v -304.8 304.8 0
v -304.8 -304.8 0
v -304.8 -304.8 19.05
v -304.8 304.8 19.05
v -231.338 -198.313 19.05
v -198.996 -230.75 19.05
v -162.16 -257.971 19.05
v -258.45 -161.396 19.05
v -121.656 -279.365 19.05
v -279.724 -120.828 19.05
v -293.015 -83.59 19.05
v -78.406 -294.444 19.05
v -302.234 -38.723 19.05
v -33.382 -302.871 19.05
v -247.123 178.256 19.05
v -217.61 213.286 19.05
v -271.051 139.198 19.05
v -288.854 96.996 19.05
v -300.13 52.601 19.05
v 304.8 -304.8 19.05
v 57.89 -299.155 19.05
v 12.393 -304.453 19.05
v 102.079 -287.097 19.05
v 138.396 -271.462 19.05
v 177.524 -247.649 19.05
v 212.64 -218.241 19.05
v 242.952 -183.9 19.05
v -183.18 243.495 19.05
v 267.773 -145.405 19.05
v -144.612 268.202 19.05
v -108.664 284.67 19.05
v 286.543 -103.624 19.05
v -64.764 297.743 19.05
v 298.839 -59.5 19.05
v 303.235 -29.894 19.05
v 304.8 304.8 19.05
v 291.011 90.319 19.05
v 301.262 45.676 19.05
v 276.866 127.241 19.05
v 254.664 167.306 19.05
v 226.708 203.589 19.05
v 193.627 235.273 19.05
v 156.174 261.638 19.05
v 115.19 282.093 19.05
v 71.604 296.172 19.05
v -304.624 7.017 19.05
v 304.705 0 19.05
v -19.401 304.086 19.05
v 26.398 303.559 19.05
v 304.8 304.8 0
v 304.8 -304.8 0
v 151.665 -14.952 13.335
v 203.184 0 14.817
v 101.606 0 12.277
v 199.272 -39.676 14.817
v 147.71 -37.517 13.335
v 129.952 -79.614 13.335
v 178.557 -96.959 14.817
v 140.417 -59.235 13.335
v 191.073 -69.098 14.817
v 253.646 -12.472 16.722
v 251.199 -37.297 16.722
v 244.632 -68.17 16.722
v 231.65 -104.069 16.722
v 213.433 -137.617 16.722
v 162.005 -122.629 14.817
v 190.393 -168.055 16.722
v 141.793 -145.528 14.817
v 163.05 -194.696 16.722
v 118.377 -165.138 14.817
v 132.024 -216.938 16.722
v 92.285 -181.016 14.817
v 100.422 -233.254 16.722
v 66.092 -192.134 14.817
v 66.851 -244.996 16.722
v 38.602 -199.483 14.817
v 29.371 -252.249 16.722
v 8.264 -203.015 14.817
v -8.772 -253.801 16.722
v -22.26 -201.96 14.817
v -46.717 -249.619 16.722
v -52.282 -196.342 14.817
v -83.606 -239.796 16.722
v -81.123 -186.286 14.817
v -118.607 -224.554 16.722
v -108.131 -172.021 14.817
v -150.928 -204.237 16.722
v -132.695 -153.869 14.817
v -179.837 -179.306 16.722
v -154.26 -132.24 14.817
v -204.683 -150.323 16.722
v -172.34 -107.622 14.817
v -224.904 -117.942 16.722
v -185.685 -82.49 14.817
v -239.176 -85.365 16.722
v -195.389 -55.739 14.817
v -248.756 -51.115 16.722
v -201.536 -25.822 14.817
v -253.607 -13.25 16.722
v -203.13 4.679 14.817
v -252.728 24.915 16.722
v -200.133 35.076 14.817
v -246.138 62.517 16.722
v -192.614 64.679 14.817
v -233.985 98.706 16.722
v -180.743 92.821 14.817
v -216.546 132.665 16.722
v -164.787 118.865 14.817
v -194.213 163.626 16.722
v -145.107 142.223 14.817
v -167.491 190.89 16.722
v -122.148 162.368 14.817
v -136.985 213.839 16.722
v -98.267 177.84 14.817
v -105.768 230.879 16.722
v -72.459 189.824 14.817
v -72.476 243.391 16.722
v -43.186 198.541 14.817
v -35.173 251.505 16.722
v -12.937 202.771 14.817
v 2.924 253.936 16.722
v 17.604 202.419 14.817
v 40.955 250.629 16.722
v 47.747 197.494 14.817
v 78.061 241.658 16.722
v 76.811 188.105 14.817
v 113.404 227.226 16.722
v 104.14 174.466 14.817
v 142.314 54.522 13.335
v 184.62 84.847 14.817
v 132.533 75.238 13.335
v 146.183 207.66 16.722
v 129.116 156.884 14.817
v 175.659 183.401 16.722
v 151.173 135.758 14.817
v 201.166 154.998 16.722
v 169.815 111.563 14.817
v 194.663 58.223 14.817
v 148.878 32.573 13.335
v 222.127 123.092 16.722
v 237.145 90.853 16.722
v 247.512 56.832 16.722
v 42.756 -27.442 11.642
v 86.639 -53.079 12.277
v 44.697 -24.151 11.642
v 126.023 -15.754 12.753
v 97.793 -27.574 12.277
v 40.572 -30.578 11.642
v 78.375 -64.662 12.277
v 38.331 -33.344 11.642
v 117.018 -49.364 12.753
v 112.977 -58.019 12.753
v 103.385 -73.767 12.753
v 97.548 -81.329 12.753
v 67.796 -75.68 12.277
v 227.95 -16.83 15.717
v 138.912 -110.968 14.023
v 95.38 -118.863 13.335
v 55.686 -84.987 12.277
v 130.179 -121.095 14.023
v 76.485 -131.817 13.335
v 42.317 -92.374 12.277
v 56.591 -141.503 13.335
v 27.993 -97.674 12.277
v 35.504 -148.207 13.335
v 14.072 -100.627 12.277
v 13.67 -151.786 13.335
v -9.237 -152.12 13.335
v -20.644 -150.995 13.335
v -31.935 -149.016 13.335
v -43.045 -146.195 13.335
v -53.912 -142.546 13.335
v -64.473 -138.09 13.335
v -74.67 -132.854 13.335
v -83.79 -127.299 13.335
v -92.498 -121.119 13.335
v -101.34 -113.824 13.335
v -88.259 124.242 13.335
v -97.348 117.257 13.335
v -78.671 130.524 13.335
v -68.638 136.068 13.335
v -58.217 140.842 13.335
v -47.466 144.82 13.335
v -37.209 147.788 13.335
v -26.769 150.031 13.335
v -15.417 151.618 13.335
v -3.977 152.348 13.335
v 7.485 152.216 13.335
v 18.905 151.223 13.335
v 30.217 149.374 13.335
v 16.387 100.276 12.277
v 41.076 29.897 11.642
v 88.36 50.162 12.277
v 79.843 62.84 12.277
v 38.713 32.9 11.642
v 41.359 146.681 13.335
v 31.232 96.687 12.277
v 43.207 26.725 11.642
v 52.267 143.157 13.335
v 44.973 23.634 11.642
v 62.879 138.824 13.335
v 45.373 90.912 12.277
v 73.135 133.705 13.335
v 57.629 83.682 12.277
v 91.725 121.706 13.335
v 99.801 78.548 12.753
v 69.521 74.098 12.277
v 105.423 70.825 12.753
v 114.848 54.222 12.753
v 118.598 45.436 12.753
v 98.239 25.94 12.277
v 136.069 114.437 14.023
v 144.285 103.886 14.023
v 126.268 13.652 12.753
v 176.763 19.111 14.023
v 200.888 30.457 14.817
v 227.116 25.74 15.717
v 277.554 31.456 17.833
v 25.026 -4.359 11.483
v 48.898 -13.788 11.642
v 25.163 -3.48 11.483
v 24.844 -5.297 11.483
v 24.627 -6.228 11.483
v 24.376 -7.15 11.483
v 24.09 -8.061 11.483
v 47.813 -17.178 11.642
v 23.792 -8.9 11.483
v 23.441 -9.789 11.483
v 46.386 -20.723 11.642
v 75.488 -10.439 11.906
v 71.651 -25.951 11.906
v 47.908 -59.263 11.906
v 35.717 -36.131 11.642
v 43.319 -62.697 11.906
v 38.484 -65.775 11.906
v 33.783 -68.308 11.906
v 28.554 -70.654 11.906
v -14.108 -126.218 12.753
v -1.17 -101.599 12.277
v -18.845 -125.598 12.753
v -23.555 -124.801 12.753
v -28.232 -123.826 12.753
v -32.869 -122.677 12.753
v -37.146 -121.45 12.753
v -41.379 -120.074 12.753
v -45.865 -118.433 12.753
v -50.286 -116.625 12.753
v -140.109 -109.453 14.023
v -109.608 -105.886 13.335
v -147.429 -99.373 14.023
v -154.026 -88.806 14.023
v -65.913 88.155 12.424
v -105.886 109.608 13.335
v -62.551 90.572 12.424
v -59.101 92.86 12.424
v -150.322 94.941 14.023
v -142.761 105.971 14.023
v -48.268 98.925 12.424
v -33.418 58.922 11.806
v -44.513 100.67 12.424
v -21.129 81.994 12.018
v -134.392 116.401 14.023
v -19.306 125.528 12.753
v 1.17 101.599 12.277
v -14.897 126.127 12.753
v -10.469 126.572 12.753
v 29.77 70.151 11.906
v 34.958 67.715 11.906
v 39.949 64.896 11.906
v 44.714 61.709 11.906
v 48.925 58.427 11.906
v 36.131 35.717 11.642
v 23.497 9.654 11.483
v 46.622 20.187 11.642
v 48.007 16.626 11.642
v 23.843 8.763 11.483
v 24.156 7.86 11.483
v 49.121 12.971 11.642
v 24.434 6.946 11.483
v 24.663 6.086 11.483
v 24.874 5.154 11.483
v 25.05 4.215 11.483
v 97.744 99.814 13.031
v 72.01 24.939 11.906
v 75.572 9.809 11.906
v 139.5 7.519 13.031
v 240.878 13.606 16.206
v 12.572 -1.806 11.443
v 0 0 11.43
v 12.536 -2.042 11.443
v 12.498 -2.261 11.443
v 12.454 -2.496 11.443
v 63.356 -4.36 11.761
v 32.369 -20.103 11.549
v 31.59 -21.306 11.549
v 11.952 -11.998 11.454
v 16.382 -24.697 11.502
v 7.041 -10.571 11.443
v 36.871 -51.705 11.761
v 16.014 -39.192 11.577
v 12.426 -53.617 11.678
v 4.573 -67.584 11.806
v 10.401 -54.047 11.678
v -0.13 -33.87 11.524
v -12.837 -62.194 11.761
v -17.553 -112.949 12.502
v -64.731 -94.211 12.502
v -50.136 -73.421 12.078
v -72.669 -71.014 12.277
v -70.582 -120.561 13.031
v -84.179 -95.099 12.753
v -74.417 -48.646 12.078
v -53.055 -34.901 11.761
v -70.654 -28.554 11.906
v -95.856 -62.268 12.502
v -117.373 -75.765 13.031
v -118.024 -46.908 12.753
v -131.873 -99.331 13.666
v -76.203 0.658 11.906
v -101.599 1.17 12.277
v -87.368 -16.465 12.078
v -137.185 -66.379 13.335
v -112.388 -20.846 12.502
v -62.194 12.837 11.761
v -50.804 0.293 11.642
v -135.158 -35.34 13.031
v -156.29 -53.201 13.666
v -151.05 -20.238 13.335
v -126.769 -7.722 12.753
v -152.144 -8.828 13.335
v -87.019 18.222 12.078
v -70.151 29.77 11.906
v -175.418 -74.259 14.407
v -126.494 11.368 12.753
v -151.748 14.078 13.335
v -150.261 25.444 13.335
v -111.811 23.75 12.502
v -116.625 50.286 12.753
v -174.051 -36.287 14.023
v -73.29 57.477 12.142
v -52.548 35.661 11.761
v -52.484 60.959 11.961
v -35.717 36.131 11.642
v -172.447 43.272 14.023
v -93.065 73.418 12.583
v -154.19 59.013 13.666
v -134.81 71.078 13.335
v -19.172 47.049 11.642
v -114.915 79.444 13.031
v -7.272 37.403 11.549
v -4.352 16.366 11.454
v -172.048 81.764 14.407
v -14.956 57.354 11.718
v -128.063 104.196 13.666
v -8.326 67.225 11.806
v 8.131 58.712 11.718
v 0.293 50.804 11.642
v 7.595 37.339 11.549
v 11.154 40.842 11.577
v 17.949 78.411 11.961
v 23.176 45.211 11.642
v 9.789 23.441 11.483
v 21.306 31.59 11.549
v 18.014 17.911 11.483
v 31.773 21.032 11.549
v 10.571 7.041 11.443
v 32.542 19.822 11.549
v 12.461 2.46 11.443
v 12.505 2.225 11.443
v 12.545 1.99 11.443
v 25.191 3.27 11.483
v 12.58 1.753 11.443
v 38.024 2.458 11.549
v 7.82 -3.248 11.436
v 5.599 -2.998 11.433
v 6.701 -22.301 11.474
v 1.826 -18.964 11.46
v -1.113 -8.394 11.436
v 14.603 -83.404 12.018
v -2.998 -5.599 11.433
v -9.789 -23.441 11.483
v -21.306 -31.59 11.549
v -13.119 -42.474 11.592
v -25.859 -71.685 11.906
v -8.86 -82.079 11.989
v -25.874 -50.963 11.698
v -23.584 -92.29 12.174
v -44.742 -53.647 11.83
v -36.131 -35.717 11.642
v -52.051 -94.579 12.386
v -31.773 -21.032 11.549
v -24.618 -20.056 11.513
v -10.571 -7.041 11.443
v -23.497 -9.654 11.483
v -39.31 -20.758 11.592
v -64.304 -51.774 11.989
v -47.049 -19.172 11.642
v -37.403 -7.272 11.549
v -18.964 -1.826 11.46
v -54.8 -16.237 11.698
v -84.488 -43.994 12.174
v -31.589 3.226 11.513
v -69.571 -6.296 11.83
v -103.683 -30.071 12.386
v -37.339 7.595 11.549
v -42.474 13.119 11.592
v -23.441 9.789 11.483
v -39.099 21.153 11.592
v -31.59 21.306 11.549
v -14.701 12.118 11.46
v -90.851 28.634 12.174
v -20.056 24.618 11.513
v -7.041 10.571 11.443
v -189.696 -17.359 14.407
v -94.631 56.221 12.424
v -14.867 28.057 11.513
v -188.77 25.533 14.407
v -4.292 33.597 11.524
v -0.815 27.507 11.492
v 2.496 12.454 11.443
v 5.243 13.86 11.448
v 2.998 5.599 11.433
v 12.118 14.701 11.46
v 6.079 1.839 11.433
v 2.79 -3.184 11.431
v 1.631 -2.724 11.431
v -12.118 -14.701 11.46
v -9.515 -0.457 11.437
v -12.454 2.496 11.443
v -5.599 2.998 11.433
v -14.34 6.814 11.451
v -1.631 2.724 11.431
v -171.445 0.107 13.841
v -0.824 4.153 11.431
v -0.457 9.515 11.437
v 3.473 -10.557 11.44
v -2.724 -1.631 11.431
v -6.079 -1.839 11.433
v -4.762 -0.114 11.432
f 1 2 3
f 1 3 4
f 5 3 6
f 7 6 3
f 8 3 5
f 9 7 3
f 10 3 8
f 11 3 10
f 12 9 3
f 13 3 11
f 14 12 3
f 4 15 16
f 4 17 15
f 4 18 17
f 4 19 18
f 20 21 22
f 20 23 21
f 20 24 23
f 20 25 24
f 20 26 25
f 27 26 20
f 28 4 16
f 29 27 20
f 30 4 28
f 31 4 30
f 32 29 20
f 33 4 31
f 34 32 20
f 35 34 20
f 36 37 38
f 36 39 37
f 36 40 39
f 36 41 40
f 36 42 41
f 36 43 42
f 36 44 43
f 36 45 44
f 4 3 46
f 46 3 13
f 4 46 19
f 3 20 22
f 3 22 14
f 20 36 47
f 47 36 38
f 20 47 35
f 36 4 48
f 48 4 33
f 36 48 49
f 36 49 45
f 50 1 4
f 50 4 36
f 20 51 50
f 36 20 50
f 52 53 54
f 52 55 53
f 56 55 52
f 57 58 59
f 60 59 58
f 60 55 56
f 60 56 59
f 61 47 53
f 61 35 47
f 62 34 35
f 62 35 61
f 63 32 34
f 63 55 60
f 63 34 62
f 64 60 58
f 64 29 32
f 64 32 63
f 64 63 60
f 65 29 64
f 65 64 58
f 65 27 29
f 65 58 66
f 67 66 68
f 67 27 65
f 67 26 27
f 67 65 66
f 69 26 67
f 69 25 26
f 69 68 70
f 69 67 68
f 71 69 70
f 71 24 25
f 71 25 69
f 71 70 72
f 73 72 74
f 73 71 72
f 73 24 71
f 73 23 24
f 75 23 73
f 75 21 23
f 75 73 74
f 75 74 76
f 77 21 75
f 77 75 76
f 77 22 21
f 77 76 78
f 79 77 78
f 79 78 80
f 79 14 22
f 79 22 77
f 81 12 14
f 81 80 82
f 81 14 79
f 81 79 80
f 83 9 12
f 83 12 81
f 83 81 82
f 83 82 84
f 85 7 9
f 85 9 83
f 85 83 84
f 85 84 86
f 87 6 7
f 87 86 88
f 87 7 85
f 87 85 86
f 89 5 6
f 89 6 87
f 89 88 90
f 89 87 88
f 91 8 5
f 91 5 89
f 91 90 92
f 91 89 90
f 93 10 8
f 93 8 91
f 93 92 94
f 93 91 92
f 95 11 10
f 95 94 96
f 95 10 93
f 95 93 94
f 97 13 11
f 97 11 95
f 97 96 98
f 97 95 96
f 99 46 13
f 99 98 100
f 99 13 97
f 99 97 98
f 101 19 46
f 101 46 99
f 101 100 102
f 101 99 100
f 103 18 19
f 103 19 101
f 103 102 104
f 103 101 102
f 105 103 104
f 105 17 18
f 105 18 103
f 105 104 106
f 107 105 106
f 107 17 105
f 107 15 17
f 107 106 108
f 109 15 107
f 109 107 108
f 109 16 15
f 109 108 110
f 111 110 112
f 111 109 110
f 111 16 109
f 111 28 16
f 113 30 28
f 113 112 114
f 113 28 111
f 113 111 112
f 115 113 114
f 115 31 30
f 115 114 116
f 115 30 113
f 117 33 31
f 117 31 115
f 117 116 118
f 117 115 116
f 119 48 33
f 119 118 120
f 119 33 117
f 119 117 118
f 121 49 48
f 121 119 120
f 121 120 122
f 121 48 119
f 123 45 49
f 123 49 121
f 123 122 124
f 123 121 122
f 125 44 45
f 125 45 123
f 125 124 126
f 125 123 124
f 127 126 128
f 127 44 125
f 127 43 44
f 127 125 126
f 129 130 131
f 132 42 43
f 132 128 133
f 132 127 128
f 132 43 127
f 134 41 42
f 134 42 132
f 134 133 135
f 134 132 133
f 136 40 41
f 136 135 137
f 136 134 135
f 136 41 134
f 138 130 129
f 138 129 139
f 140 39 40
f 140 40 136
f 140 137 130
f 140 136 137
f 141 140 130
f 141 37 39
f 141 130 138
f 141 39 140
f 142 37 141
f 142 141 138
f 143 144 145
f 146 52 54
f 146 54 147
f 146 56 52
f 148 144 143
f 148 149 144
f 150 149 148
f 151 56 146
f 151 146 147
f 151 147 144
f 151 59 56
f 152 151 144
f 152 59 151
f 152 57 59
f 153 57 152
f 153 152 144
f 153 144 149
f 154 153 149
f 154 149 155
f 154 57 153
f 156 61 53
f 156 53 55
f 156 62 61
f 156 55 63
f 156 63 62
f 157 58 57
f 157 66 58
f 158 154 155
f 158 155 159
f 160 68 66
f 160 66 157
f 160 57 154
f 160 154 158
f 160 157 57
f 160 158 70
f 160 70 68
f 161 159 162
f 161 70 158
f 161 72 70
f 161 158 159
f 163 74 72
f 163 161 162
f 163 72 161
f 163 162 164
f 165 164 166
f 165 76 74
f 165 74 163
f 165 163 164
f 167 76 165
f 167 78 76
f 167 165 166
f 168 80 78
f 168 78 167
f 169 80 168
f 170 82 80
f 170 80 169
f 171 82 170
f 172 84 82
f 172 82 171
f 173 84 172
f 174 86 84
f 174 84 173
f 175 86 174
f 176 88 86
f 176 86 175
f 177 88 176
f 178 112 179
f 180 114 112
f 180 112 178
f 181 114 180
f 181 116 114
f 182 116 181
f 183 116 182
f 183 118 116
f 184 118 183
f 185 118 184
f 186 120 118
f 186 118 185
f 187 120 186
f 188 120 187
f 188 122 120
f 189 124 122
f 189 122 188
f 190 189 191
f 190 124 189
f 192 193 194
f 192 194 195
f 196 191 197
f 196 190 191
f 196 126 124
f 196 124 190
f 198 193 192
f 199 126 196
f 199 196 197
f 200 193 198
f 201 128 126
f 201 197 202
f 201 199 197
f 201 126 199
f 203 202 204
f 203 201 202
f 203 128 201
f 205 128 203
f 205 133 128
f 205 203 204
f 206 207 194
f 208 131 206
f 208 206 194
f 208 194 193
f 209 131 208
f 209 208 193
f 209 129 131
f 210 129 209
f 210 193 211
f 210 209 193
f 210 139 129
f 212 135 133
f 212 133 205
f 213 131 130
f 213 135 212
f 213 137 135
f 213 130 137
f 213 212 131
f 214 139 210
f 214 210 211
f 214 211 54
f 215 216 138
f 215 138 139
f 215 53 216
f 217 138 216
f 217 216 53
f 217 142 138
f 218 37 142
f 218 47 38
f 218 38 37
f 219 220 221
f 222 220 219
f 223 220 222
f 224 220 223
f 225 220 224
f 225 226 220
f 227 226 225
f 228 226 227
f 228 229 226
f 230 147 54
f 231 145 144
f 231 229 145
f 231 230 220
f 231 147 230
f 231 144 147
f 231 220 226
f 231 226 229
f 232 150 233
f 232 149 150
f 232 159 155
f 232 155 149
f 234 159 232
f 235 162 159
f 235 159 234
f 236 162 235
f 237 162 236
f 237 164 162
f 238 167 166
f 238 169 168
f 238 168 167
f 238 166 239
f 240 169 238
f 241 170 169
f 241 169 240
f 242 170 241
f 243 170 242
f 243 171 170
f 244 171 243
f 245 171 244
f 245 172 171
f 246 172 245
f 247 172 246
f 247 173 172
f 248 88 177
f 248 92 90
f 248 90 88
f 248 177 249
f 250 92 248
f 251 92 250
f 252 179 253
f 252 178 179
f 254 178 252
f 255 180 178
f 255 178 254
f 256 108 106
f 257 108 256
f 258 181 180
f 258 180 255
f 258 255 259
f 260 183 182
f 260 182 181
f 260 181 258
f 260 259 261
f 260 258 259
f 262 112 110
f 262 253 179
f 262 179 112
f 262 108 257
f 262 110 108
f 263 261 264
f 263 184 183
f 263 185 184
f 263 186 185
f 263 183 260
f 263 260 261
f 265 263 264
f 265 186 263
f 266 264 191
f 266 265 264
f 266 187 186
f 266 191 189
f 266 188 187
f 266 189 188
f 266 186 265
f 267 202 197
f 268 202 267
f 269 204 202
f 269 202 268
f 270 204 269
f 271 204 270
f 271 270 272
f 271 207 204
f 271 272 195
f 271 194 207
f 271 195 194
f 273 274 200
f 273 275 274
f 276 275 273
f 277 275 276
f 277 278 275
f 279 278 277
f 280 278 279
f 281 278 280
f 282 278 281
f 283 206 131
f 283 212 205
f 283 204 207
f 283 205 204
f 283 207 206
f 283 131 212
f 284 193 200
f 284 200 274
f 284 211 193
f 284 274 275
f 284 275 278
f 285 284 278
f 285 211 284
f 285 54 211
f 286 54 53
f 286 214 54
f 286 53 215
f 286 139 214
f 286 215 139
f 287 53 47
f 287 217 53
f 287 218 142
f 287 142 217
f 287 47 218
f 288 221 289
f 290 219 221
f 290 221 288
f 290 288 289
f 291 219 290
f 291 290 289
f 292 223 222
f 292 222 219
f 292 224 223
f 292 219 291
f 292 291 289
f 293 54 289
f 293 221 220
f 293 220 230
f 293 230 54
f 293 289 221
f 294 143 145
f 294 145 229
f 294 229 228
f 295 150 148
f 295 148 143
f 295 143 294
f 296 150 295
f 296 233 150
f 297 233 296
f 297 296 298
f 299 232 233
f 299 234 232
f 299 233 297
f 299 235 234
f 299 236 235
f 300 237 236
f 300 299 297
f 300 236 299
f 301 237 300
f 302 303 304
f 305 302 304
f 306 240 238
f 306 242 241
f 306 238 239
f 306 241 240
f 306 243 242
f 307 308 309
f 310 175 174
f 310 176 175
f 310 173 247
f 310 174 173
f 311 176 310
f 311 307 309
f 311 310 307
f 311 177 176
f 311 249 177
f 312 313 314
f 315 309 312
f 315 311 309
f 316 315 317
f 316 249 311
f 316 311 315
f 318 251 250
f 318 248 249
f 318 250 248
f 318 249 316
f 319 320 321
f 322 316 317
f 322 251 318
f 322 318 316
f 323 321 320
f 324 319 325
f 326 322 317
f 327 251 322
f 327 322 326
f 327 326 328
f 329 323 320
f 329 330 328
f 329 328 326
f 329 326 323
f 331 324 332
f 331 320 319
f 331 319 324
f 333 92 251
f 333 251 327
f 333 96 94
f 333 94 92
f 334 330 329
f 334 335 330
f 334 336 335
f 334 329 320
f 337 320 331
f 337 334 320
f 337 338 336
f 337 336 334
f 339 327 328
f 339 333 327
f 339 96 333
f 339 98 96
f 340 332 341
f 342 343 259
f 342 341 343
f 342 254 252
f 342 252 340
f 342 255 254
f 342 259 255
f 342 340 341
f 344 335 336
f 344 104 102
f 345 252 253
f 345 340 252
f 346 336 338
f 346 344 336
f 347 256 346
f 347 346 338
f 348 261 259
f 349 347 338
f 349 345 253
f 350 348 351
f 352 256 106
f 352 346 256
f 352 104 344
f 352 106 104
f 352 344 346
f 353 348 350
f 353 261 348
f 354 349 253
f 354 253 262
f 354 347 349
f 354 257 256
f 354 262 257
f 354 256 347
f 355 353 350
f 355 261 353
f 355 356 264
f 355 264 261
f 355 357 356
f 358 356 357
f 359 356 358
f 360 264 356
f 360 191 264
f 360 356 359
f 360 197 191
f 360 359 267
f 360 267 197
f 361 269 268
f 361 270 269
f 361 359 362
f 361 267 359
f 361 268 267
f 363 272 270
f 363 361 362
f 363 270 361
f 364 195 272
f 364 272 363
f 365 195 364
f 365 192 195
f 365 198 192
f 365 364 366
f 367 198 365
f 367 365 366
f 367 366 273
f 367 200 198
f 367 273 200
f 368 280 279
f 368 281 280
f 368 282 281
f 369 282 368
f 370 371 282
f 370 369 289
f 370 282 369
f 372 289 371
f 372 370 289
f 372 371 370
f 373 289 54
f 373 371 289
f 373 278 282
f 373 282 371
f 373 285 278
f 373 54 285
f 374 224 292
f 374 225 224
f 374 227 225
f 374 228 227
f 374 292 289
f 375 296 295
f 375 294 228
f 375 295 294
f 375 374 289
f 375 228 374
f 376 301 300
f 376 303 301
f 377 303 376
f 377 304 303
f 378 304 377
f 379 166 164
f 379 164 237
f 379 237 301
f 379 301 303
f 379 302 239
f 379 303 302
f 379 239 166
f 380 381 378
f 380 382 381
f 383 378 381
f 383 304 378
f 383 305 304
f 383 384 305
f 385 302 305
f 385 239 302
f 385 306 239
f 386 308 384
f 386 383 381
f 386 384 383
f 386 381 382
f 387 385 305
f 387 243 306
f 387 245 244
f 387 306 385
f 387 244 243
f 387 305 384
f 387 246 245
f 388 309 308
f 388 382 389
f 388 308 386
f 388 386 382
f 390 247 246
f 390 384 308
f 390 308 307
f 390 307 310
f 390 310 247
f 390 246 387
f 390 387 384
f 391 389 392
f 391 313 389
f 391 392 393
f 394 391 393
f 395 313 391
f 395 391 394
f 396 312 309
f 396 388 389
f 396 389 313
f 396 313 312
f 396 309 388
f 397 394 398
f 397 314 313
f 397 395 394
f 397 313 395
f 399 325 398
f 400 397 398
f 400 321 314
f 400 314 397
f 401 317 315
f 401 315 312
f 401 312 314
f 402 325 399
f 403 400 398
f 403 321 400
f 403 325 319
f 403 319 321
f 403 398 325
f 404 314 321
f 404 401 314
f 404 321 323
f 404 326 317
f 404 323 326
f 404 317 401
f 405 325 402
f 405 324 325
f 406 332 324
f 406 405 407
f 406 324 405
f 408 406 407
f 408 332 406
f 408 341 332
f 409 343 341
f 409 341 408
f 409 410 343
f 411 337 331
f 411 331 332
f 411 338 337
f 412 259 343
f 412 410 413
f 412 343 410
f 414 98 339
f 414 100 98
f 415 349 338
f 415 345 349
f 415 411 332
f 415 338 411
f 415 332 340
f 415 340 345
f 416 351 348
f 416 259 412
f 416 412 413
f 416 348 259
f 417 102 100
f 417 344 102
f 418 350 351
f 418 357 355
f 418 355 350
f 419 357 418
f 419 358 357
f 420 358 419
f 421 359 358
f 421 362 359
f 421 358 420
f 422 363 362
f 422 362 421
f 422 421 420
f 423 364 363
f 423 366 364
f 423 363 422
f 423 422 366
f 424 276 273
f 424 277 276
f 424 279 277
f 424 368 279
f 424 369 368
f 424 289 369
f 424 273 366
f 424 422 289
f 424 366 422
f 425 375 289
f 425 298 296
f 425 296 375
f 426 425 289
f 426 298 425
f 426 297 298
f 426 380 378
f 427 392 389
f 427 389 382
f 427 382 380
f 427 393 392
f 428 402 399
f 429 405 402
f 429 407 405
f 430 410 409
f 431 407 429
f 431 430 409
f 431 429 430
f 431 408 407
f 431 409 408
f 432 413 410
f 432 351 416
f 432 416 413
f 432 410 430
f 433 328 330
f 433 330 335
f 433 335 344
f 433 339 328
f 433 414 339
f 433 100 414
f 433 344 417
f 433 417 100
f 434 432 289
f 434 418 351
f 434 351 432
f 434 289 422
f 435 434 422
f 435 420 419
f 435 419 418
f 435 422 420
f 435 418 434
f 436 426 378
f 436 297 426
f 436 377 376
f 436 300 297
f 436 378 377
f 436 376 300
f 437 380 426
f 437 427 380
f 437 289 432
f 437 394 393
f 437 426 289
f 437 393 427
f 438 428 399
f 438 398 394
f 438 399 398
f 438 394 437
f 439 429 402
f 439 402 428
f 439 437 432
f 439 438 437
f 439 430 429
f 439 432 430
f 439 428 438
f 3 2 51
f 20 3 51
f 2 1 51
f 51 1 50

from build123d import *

# Parameters (mm, degrees)
F0_W     = 609.6
F0_H     = 609.6
F1_DEPTH = 19.05


with BuildPart() as f1:
    # F0 (on Top) → F1 (new body)
    with BuildSketch(Plane.XY):
        Rectangle(F0_W, F0_H)
    extrude(amount=F1_DEPTH)

    # F2 (on Front) → F3 (revolve, cut)
    with BuildSketch(Plane.XZ):
        with BuildLine():
            Line((0, 6107.43), (0, 11.43))
            ThreePointArc((0, 11.43), (4310.522938, 1796.907062), (6096, 6107.43))
            Line((6096, 6107.43), (0, 6107.43))
        make_face()
    revolve(axis=Axis((0, 0, 2706.899623), (0, 0, -1)), mode=Mode.SUBTRACT)


solid = f1.part
